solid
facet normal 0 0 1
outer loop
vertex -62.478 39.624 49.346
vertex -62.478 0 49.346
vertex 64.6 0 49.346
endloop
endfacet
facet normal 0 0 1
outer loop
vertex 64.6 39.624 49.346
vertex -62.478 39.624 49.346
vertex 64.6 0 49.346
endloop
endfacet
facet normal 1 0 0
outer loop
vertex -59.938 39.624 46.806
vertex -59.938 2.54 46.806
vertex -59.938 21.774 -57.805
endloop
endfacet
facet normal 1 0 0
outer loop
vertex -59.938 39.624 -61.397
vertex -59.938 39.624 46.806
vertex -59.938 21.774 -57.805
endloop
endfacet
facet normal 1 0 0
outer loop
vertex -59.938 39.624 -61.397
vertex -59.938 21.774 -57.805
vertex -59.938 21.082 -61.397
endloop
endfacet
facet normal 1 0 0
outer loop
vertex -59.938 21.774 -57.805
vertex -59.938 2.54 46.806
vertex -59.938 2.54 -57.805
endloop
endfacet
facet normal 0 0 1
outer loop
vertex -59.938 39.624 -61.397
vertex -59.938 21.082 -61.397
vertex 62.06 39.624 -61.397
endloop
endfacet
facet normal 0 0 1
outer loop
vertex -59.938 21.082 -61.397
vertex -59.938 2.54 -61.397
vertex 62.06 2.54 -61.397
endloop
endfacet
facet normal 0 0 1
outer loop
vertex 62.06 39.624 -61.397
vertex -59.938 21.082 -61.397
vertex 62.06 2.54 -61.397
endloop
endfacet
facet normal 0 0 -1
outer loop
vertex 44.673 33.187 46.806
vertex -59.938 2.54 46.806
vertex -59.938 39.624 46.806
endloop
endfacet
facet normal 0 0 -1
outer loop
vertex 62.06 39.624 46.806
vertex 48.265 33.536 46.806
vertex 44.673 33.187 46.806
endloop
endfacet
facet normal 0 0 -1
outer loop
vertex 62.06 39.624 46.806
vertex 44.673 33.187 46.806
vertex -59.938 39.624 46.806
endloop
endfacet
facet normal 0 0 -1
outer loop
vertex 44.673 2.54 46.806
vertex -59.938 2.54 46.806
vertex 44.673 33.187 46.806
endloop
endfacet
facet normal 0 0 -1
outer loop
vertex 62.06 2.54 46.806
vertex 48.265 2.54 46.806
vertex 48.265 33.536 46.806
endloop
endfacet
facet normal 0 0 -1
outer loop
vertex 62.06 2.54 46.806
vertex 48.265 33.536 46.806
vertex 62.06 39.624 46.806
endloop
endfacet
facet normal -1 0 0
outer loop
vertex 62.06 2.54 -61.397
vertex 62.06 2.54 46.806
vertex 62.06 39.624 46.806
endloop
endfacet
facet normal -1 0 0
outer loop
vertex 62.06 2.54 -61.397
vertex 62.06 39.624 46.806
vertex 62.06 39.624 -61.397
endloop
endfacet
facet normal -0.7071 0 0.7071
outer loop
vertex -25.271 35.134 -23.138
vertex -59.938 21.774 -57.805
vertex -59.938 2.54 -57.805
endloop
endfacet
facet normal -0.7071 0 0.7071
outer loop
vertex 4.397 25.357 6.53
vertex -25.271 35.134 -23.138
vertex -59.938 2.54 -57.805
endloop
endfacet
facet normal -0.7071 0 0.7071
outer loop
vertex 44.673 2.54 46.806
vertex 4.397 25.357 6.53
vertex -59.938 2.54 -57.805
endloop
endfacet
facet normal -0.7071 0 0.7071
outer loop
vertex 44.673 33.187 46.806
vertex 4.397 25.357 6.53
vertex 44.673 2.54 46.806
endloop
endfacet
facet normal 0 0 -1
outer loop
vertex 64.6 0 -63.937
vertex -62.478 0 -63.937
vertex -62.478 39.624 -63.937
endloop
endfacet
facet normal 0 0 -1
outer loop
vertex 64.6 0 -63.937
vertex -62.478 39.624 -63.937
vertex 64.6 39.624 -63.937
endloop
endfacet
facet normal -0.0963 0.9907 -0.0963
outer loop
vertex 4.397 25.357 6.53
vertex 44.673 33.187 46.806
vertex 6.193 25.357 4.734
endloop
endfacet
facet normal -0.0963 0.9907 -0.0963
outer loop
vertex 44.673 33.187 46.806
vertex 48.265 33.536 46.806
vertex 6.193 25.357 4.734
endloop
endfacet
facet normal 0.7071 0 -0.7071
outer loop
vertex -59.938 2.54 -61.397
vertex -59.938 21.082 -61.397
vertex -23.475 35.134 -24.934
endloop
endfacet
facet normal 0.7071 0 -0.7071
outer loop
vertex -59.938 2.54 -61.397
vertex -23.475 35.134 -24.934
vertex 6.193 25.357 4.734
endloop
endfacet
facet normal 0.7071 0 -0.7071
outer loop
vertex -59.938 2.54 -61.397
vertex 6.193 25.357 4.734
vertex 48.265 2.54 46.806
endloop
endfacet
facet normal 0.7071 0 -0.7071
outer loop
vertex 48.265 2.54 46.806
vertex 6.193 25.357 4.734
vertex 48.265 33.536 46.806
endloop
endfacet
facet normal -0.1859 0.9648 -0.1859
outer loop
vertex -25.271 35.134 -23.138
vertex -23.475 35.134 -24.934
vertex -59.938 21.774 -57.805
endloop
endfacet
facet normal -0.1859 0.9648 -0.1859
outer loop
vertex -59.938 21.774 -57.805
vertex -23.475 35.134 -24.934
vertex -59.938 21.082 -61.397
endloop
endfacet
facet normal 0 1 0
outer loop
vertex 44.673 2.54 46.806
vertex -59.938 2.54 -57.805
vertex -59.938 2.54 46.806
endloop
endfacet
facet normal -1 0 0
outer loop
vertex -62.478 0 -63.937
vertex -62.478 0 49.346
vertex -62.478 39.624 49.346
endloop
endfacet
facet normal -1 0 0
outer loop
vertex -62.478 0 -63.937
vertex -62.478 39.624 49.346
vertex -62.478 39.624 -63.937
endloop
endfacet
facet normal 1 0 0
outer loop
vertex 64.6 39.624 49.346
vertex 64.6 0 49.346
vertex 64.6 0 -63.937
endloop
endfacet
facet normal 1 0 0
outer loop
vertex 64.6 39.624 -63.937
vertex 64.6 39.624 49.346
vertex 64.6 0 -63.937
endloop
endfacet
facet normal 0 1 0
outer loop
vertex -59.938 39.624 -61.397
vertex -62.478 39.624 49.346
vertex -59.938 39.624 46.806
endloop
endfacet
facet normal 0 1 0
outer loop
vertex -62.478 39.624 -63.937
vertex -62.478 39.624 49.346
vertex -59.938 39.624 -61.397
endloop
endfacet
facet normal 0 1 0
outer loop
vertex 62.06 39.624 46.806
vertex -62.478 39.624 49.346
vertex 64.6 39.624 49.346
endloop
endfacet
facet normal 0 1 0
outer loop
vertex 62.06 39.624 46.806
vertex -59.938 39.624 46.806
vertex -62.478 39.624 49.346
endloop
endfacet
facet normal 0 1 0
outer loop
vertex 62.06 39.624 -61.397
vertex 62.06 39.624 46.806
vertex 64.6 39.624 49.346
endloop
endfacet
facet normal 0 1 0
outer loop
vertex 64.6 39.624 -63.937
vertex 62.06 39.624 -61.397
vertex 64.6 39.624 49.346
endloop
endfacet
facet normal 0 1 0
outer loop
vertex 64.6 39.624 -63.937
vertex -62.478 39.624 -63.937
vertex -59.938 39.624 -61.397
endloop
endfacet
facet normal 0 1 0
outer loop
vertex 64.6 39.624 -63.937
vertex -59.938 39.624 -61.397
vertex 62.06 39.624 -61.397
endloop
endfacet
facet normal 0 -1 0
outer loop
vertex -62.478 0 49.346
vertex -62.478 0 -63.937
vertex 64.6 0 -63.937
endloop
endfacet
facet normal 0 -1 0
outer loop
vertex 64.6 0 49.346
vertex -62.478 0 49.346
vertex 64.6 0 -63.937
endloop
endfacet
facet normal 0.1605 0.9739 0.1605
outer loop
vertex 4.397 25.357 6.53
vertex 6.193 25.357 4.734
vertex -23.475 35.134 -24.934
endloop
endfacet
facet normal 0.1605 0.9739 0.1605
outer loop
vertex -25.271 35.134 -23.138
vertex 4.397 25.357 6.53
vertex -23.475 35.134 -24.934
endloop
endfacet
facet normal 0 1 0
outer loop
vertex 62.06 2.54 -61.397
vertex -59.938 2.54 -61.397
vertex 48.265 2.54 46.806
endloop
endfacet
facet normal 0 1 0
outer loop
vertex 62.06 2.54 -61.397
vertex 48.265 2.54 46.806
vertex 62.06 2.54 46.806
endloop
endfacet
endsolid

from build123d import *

# Parameters (mm, degrees)
SKETCH1_W                  = 127.078191072
SKETCH1_H                  = 113.282646321
BOSS_EXTRUDE1_DEPTH        = 39.624
SHELL_1_T                  = -2.54
OFFICIAL_RIB_BLOCK20_DEPTH = 2.54


# Read off the part's stored shape, not the designer's step: official_rib_block20
with BuildPart() as part:
    # Sketch1 → Boss-Extrude1 (new body)
    with BuildSketch(Plane(origin=(0, 0, 0), x_dir=(1, 0, 0), z_dir=(0, 1, 0))):
        with Locations((1.06119575, 7.295720781)):
            Rectangle(SKETCH1_W, SKETCH1_H)
    extrude(amount=BOSS_EXTRUDE1_DEPTH)

    # 抽壳1
    shell_1_openings = [part.faces().sort_by_distance(p)[0] for p in [
        (1.06119575, 39.624, -7.295720782),
    ]]
    offset(amount=SHELL_1_T, openings=shell_1_openings, kind=Kind.INTERSECTION)

    # official_rib_block20 outline → official_rib_block20 (add)
    with BuildSketch(Plane(origin=(0.729572078, 0, -0.729572078), x_dir=(0.7071067811865477, 0, 0.7071067811865475), z_dir=(-0.7071067811865475, 0, 0.7071067811865477))):
        Polygon((67.224888407, 33.535890054), (7.726, 25.357), (-34.23, 35.134), (-85.796761505, 21.08206499), (-86, 21.02668253), (-86, 2), (68, 2), (68, 33.642439145), align=None)
    extrude(amount=OFFICIAL_RIB_BLOCK20_DEPTH)


solid = part.part
